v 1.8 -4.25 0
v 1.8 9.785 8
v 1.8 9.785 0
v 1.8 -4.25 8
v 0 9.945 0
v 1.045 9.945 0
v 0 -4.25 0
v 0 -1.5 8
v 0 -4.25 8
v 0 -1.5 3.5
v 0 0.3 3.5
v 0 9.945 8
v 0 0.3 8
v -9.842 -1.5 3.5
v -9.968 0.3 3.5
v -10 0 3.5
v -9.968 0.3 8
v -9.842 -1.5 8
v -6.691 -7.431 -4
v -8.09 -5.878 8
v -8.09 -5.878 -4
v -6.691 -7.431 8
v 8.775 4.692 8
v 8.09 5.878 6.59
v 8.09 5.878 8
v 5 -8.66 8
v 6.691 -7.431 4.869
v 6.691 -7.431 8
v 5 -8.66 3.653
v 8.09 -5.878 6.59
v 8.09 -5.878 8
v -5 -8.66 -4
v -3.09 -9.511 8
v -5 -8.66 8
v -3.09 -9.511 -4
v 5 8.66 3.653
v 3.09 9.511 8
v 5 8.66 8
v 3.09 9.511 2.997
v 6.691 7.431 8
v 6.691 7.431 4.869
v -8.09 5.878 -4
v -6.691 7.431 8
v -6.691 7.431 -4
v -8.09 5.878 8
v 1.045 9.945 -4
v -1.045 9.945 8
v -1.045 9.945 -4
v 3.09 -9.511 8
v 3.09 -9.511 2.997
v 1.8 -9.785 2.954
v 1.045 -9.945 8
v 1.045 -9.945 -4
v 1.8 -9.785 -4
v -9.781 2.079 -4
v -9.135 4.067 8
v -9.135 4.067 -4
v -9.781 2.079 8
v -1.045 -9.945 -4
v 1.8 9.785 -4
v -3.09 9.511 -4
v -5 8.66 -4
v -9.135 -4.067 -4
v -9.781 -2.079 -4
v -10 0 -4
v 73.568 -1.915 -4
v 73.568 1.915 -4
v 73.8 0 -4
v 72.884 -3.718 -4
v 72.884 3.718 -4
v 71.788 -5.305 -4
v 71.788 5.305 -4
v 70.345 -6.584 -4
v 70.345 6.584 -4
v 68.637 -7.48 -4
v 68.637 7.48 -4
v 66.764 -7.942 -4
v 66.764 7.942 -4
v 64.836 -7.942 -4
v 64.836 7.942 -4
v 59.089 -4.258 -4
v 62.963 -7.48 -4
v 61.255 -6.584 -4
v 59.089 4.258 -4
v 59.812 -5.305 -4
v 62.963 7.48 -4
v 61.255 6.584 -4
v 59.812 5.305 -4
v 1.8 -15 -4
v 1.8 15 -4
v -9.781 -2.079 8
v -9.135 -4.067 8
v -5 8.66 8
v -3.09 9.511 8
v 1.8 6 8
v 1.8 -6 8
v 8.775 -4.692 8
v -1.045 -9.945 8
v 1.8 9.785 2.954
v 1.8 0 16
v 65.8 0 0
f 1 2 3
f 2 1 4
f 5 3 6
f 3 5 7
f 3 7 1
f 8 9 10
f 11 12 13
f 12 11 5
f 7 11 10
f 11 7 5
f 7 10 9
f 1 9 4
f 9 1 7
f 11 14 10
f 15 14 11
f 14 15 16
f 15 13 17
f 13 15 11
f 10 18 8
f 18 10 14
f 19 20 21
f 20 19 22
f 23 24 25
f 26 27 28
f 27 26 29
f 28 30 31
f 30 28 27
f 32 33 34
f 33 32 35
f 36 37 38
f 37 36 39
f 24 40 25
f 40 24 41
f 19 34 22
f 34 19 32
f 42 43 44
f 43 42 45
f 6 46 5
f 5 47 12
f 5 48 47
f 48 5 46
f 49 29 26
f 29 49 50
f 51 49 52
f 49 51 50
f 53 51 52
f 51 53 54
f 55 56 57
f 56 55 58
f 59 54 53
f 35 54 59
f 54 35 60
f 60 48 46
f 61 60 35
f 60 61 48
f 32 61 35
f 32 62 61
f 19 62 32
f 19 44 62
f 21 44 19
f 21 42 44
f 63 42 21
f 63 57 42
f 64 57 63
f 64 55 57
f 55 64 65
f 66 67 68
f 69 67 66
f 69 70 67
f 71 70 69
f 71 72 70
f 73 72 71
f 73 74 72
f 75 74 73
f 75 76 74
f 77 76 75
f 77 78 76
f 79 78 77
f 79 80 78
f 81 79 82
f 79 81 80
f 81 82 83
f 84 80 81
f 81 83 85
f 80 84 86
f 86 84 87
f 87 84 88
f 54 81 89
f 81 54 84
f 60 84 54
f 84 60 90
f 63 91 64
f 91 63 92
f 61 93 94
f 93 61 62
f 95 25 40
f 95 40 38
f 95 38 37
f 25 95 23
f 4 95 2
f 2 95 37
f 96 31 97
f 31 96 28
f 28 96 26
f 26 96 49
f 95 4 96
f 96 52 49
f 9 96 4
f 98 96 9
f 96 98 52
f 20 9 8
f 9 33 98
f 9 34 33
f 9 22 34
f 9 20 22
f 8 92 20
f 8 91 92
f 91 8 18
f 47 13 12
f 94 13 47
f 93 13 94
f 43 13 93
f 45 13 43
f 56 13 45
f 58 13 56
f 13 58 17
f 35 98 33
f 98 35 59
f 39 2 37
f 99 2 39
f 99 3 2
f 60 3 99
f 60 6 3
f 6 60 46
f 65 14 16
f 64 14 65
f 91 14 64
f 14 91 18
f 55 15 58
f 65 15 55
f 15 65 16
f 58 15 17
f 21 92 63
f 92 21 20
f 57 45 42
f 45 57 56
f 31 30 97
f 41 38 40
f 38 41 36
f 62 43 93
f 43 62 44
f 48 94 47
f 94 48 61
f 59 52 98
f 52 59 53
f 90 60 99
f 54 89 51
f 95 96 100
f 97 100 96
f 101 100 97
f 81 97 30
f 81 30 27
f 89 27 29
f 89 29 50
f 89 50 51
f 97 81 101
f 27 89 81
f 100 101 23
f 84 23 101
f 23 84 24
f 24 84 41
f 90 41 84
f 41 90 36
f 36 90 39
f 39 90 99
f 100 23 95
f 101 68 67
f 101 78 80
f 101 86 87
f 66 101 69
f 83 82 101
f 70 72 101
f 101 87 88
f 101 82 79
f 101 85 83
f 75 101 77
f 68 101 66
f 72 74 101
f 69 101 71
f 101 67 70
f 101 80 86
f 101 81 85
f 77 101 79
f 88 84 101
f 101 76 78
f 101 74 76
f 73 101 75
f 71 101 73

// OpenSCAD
/**
 * Copyright 2019 Nathan Fairhurst.
 */

PRINTRBOT_WALL_THICKNESS = 1.5;
MICRO_SD_CARD_WIDTH = 11;
MICRO_SD_CARD_LENGTH = 15;
MICRO_SD_CARD_THICKNESS = 2/3;
MICRO_SD_CARD_PROTRUSION = 4;

SD_CARD_WIDTH = 24;
SD_CARD_LENGTH = 32;
SD_CARD_THICKNESS = 2.12;
SD_CARD_PROTRUSION = 9;

module card(width, length, thickness, tolerance) {
  cube([width + tolerance, length + tolerance, thickness + tolerance]);
}

module card_holder(
  card_width,
  card_length,
  card_thickness,
  card_protrusion,
  wall_thickness,
  tolerance
) {
  difference() {
    cube([
      wall_thickness * 2 + tolerance * 3 + card_width,
      wall_thickness * 2 + tolerance * 3 + card_thickness,
      wall_thickness + card_length - card_protrusion
    ]);
    translate([wall_thickness + tolerance,
      wall_thickness + tolerance * 2 + card_thickness,
      wall_thickness + tolerance
    ])
      rotate([90, 0, 0])
        card(card_width, card_length, card_thickness, tolerance);
  }
}

module printrbot_base(
  tolerance
) {
  front_depth_offset = 3.5;
  side_height_offset = 2.75;
  side_wall_height = 45;
  front_wall_length = 92;

  translate([0, -side_height_offset - PRINTRBOT_WALL_THICKNESS, 0])
    cube([PRINTRBOT_WALL_THICKNESS + tolerance, 400, side_wall_height]);
  translate([-front_wall_length / 2, -PRINTRBOT_WALL_THICKNESS, front_depth_offset])
    cube([
      front_wall_length / 2,
      PRINTRBOT_WALL_THICKNESS + tolerance,
      side_wall_height - front_depth_offset * 2
    ]);
}


module bracket(length, width, height, height_at_truncation) {
  true_length = length / (height - height_at_truncation) * height;

  difference() {
    polyhedron(
      points=[[0, width / 2, 0],[0,0, height],[0, -width / 2,0],[true_length,0,0]],
      faces=[[0,1,2],[2,1,3],[3,1,0],[3,0,2]]
    );
    translate([length,-width/2,0])
      cube([true_length - length, width, height_at_truncation]);
  }
}

module foot(tolerance) {
  base_thickness = 4;
  foot_wall_thickness = 4;
  difference() {
    translate([0,0,-base_thickness])
      cylinder(12,10,10);
    printrbot_base(tolerance);
  }
}

module foot_with_wing(tolerance) {
  bottom_clearance = 4;
  wing_length = 64;

  foot(tolerance);
  translate([PRINTRBOT_WALL_THICKNESS + tolerance, 0, -bottom_clearance])
    bracket(wing_length, 30, 20, bottom_clearance);
  translate([PRINTRBOT_WALL_THICKNESS + tolerance + wing_length, 0, -bottom_clearance])
    cylinder(bottom_clearance, 8, 0);
}

foot_with_wing(0.3);

/*
card_holder(
  SD_CARD_WIDTH,
  SD_CARD_LENGTH,
  SD_CARD_THICKNESS,
  SD_CARD_PROTRUSION,
  1,
  0.3
);
*/
